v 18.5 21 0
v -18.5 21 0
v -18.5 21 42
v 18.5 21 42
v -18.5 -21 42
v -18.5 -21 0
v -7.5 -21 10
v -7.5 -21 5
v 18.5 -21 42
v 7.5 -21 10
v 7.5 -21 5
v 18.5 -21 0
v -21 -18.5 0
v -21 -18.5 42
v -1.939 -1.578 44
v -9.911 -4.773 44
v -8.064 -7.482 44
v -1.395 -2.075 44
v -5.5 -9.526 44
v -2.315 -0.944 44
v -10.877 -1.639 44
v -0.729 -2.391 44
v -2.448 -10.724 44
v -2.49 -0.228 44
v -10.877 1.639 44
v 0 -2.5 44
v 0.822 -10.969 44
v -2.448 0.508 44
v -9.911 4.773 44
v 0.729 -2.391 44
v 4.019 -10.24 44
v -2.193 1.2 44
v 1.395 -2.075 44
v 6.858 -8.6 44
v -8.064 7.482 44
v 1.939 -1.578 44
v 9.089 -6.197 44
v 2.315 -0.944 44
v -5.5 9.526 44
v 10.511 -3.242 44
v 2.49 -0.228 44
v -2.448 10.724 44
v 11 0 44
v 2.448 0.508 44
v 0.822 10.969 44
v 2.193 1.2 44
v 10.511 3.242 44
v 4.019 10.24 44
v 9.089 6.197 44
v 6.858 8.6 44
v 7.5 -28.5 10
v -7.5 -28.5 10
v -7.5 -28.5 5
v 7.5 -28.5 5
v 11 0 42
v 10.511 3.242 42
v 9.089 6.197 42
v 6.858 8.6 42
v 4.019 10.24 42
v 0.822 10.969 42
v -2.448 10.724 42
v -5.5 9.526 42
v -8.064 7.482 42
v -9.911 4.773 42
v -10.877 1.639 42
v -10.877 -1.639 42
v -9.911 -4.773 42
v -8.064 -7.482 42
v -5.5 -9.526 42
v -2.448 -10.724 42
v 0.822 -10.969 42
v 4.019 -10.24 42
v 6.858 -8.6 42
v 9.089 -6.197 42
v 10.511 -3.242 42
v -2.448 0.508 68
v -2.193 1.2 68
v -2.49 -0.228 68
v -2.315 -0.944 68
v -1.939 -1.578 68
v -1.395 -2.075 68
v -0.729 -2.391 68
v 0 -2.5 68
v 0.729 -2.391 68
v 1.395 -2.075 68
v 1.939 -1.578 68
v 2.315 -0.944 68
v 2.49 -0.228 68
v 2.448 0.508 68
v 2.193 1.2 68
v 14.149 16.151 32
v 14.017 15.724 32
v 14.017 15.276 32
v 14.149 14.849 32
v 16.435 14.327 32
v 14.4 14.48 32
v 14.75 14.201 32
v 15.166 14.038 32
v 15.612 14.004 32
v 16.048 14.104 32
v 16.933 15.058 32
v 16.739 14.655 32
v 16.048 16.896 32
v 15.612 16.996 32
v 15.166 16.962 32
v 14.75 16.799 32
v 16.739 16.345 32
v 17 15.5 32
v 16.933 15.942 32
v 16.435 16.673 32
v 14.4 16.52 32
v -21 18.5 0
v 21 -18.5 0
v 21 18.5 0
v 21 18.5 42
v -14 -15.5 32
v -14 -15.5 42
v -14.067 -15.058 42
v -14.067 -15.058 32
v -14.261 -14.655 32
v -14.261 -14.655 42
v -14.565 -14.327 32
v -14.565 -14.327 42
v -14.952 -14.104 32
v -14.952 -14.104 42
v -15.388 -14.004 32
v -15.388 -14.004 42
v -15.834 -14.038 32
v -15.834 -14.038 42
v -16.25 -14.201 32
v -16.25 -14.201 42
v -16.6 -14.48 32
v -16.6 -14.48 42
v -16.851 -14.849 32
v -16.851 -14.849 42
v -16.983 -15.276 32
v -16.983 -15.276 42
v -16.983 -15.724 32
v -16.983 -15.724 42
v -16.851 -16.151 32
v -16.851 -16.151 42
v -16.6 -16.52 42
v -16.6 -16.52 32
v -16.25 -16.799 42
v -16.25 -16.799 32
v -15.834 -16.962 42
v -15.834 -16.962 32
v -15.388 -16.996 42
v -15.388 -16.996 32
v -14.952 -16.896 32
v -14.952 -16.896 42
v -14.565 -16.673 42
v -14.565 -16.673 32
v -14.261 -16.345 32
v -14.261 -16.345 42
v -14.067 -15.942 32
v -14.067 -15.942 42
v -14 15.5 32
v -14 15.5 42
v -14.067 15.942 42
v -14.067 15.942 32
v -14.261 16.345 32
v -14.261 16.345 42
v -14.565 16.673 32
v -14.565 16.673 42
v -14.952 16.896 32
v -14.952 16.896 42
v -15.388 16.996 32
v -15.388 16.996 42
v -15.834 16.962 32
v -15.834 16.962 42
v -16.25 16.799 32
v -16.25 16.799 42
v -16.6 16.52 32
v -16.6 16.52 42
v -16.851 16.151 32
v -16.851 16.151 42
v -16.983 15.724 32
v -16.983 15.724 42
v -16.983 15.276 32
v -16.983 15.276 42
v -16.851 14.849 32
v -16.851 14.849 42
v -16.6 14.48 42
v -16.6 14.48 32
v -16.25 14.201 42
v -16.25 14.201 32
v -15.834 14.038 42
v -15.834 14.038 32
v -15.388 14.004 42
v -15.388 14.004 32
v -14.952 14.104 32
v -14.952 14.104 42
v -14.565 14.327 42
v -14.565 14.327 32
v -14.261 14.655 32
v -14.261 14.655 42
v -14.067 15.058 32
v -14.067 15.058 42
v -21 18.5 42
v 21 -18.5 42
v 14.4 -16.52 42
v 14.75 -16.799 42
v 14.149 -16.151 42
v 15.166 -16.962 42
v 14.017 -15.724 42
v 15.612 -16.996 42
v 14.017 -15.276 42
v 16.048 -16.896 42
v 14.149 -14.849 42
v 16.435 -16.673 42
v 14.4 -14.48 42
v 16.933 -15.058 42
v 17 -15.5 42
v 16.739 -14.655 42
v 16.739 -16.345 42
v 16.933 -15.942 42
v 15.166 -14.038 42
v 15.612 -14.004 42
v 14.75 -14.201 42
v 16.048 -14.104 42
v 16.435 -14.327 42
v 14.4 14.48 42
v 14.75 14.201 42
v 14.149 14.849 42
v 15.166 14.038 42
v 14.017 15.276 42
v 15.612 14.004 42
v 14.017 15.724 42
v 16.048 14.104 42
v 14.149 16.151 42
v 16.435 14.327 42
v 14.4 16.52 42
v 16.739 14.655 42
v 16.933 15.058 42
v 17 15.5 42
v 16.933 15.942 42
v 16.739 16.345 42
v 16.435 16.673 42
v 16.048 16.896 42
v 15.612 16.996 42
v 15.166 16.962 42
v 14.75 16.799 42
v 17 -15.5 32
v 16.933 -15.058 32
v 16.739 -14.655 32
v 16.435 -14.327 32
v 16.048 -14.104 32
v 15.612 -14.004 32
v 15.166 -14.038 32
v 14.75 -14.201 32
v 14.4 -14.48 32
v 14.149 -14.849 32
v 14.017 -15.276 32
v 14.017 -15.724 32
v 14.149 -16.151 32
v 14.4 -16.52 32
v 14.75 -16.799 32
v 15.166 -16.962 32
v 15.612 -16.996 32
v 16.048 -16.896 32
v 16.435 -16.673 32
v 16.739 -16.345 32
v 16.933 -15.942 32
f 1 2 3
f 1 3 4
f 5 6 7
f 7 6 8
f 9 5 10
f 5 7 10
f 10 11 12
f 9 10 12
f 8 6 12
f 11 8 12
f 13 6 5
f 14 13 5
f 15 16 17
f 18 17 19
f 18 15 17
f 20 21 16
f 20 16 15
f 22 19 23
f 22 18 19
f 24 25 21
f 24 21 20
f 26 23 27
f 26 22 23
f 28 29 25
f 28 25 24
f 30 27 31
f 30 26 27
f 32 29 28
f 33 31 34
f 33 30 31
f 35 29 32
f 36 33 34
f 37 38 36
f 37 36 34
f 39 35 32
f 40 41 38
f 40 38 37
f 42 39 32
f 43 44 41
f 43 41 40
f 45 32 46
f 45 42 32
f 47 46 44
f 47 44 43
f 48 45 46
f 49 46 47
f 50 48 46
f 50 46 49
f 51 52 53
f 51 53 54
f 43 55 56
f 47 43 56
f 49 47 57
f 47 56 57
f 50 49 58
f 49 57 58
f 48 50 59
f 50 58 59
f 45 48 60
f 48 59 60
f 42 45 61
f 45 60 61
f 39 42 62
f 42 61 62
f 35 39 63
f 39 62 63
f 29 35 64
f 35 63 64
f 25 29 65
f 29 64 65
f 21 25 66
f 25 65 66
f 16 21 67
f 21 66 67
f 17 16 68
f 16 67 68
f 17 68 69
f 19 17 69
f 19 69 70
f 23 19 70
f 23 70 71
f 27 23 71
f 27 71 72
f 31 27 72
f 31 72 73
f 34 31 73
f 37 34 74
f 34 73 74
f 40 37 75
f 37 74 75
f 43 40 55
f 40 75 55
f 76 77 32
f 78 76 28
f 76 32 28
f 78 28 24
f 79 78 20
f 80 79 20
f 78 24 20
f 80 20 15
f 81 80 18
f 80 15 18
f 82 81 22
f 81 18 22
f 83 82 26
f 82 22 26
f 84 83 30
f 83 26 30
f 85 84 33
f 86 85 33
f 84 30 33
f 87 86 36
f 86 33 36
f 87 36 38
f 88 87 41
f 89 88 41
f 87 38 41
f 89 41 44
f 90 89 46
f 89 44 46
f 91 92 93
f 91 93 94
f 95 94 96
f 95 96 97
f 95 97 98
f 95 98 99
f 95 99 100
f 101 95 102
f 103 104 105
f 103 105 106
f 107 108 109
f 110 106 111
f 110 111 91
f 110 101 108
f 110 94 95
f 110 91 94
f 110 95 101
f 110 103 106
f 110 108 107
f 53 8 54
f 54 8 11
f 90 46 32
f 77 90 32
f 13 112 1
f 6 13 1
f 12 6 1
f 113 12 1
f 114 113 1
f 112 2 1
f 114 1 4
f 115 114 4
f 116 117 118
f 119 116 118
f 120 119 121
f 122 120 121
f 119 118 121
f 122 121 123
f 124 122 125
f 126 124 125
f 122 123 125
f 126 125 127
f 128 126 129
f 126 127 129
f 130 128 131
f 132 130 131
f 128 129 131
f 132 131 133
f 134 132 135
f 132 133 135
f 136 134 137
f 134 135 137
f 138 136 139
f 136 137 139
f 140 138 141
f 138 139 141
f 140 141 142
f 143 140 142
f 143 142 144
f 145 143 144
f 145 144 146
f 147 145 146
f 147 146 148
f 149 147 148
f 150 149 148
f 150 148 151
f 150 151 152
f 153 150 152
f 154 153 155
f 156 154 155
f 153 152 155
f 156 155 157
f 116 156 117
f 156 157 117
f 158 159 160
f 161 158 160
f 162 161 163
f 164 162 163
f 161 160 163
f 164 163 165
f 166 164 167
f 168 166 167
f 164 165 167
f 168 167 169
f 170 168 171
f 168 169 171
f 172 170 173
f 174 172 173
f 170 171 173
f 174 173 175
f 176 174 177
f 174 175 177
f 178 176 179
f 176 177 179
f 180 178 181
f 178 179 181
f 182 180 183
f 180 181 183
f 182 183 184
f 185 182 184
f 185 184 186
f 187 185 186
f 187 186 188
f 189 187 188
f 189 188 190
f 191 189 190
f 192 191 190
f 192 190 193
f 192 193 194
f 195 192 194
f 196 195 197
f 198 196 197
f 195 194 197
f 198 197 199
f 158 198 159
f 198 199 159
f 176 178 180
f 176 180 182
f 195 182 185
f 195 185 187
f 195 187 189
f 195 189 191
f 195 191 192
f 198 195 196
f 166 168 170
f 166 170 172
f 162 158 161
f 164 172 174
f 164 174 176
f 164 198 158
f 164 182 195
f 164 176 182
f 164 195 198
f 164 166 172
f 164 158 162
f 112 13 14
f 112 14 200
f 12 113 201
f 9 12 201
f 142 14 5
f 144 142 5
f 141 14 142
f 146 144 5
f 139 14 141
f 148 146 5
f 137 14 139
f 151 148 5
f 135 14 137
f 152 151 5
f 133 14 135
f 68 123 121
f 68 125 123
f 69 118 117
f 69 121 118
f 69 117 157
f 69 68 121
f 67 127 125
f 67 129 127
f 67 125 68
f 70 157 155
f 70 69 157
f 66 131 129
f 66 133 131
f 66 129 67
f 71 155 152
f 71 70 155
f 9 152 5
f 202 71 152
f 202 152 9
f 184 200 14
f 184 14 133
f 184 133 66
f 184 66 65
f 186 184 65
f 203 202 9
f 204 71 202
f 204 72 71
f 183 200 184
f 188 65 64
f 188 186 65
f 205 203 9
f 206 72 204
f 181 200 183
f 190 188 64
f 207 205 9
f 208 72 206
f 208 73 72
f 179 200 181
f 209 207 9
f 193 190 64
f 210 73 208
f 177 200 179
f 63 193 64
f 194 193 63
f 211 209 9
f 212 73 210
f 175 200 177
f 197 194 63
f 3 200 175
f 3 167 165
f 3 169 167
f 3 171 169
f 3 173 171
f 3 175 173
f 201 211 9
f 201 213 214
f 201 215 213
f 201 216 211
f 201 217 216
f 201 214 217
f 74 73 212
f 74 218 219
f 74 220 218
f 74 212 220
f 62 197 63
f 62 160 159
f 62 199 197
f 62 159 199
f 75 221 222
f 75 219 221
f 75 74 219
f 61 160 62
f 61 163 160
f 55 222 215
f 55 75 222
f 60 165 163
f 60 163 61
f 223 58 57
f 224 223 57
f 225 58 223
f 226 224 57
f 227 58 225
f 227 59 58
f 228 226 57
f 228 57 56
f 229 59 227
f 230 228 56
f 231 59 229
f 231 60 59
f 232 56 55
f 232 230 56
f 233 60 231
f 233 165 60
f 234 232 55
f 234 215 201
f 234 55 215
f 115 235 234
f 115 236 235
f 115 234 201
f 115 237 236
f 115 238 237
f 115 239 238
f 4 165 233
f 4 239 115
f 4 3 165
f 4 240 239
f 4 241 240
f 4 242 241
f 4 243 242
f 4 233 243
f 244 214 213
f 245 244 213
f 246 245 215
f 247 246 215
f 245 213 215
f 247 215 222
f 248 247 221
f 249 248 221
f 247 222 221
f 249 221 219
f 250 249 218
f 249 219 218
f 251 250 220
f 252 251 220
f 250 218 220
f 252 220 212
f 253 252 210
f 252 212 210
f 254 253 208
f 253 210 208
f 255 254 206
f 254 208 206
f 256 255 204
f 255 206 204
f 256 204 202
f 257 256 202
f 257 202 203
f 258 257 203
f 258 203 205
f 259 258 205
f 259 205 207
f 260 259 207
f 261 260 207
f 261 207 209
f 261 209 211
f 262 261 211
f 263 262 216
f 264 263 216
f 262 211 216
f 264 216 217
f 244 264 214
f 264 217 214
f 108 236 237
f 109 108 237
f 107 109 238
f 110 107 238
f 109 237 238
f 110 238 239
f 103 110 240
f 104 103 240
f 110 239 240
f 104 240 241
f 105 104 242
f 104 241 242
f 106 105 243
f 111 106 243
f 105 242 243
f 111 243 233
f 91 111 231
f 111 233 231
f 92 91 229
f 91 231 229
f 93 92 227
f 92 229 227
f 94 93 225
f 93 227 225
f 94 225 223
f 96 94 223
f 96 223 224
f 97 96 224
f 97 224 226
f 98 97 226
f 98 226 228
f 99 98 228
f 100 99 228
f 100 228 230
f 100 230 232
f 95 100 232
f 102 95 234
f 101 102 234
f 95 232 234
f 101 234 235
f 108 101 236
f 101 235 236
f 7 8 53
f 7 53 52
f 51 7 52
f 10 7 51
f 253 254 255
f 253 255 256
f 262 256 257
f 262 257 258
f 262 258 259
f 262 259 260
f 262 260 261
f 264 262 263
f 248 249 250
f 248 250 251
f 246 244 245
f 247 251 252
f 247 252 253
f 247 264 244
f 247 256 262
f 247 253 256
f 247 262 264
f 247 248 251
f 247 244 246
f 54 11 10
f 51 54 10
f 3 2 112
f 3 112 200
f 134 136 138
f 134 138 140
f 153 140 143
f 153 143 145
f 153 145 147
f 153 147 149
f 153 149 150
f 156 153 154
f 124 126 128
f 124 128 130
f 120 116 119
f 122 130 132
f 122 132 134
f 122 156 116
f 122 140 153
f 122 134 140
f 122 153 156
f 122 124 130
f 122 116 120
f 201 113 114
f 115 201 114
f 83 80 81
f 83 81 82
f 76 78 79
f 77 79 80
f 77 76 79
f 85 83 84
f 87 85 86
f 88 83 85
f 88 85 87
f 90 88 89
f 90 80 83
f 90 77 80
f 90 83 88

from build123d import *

# Parameters (mm, degrees)
F0_W      = 42
F0_H      = 42
F1_DEPTH  = 42
F2_SIZE   = 2.5
F3_R      = 1.5
F4_DEPTH  = 10
F5_R      = 11
F6_DEPTH  = 2
F8_DEPTH  = 24
F9_W      = 15
F9_H      = 5
F10_DEPTH = 7.5


with BuildPart() as f1:
    # F0 (on Top) → F1 (new body)
    with BuildSketch(Plane.XY):
        Rectangle(F0_W, F0_H)
    extrude(amount=F1_DEPTH)

    # F2
    f2_edges = [f1.edges().sort_by_distance(p)[0] for p in [
        (-21, -21, 21),
        (21, -21, 21),
        (21, 21, 21),
        (-21, 21, 21),
    ]]
    chamfer(f2_edges, length=F2_SIZE)

    # F3 (on face) → F4 (cut)
    with BuildSketch(Plane.XY.offset(42)):
        with Locations((-15.5, 15.5)):
            Circle(F3_R)
        with Locations((15.5, 15.5)):
            Circle(F3_R)
        with Locations((15.5, -15.5)):
            Circle(F3_R)
        with Locations((-15.5, -15.5)):
            Circle(F3_R)
    extrude(amount=-F4_DEPTH, mode=Mode.SUBTRACT)

    # F5 (on face) → F6 (join)
    with BuildSketch(Plane.XY.offset(42)):
        Circle(F5_R)
    extrude(amount=F6_DEPTH)

    # F7 (on face) → F8 (join)
    with BuildSketch(Plane.XY.offset(44)):
        with BuildLine():
            Line((2.193171, 1.2), (-2.193171, 1.2))
            ThreePointArc((-2.193171, 1.2), (0, -2.5), (2.193171, 1.2))
        make_face()
    extrude(amount=F8_DEPTH)

    # F9 (on face) → F10 (join)
    with BuildSketch(Plane.XZ.offset(21)):
        with Locations((0, 7.5)):
            Rectangle(F9_W, F9_H)
    extrude(amount=F10_DEPTH)


solid = f1.part
